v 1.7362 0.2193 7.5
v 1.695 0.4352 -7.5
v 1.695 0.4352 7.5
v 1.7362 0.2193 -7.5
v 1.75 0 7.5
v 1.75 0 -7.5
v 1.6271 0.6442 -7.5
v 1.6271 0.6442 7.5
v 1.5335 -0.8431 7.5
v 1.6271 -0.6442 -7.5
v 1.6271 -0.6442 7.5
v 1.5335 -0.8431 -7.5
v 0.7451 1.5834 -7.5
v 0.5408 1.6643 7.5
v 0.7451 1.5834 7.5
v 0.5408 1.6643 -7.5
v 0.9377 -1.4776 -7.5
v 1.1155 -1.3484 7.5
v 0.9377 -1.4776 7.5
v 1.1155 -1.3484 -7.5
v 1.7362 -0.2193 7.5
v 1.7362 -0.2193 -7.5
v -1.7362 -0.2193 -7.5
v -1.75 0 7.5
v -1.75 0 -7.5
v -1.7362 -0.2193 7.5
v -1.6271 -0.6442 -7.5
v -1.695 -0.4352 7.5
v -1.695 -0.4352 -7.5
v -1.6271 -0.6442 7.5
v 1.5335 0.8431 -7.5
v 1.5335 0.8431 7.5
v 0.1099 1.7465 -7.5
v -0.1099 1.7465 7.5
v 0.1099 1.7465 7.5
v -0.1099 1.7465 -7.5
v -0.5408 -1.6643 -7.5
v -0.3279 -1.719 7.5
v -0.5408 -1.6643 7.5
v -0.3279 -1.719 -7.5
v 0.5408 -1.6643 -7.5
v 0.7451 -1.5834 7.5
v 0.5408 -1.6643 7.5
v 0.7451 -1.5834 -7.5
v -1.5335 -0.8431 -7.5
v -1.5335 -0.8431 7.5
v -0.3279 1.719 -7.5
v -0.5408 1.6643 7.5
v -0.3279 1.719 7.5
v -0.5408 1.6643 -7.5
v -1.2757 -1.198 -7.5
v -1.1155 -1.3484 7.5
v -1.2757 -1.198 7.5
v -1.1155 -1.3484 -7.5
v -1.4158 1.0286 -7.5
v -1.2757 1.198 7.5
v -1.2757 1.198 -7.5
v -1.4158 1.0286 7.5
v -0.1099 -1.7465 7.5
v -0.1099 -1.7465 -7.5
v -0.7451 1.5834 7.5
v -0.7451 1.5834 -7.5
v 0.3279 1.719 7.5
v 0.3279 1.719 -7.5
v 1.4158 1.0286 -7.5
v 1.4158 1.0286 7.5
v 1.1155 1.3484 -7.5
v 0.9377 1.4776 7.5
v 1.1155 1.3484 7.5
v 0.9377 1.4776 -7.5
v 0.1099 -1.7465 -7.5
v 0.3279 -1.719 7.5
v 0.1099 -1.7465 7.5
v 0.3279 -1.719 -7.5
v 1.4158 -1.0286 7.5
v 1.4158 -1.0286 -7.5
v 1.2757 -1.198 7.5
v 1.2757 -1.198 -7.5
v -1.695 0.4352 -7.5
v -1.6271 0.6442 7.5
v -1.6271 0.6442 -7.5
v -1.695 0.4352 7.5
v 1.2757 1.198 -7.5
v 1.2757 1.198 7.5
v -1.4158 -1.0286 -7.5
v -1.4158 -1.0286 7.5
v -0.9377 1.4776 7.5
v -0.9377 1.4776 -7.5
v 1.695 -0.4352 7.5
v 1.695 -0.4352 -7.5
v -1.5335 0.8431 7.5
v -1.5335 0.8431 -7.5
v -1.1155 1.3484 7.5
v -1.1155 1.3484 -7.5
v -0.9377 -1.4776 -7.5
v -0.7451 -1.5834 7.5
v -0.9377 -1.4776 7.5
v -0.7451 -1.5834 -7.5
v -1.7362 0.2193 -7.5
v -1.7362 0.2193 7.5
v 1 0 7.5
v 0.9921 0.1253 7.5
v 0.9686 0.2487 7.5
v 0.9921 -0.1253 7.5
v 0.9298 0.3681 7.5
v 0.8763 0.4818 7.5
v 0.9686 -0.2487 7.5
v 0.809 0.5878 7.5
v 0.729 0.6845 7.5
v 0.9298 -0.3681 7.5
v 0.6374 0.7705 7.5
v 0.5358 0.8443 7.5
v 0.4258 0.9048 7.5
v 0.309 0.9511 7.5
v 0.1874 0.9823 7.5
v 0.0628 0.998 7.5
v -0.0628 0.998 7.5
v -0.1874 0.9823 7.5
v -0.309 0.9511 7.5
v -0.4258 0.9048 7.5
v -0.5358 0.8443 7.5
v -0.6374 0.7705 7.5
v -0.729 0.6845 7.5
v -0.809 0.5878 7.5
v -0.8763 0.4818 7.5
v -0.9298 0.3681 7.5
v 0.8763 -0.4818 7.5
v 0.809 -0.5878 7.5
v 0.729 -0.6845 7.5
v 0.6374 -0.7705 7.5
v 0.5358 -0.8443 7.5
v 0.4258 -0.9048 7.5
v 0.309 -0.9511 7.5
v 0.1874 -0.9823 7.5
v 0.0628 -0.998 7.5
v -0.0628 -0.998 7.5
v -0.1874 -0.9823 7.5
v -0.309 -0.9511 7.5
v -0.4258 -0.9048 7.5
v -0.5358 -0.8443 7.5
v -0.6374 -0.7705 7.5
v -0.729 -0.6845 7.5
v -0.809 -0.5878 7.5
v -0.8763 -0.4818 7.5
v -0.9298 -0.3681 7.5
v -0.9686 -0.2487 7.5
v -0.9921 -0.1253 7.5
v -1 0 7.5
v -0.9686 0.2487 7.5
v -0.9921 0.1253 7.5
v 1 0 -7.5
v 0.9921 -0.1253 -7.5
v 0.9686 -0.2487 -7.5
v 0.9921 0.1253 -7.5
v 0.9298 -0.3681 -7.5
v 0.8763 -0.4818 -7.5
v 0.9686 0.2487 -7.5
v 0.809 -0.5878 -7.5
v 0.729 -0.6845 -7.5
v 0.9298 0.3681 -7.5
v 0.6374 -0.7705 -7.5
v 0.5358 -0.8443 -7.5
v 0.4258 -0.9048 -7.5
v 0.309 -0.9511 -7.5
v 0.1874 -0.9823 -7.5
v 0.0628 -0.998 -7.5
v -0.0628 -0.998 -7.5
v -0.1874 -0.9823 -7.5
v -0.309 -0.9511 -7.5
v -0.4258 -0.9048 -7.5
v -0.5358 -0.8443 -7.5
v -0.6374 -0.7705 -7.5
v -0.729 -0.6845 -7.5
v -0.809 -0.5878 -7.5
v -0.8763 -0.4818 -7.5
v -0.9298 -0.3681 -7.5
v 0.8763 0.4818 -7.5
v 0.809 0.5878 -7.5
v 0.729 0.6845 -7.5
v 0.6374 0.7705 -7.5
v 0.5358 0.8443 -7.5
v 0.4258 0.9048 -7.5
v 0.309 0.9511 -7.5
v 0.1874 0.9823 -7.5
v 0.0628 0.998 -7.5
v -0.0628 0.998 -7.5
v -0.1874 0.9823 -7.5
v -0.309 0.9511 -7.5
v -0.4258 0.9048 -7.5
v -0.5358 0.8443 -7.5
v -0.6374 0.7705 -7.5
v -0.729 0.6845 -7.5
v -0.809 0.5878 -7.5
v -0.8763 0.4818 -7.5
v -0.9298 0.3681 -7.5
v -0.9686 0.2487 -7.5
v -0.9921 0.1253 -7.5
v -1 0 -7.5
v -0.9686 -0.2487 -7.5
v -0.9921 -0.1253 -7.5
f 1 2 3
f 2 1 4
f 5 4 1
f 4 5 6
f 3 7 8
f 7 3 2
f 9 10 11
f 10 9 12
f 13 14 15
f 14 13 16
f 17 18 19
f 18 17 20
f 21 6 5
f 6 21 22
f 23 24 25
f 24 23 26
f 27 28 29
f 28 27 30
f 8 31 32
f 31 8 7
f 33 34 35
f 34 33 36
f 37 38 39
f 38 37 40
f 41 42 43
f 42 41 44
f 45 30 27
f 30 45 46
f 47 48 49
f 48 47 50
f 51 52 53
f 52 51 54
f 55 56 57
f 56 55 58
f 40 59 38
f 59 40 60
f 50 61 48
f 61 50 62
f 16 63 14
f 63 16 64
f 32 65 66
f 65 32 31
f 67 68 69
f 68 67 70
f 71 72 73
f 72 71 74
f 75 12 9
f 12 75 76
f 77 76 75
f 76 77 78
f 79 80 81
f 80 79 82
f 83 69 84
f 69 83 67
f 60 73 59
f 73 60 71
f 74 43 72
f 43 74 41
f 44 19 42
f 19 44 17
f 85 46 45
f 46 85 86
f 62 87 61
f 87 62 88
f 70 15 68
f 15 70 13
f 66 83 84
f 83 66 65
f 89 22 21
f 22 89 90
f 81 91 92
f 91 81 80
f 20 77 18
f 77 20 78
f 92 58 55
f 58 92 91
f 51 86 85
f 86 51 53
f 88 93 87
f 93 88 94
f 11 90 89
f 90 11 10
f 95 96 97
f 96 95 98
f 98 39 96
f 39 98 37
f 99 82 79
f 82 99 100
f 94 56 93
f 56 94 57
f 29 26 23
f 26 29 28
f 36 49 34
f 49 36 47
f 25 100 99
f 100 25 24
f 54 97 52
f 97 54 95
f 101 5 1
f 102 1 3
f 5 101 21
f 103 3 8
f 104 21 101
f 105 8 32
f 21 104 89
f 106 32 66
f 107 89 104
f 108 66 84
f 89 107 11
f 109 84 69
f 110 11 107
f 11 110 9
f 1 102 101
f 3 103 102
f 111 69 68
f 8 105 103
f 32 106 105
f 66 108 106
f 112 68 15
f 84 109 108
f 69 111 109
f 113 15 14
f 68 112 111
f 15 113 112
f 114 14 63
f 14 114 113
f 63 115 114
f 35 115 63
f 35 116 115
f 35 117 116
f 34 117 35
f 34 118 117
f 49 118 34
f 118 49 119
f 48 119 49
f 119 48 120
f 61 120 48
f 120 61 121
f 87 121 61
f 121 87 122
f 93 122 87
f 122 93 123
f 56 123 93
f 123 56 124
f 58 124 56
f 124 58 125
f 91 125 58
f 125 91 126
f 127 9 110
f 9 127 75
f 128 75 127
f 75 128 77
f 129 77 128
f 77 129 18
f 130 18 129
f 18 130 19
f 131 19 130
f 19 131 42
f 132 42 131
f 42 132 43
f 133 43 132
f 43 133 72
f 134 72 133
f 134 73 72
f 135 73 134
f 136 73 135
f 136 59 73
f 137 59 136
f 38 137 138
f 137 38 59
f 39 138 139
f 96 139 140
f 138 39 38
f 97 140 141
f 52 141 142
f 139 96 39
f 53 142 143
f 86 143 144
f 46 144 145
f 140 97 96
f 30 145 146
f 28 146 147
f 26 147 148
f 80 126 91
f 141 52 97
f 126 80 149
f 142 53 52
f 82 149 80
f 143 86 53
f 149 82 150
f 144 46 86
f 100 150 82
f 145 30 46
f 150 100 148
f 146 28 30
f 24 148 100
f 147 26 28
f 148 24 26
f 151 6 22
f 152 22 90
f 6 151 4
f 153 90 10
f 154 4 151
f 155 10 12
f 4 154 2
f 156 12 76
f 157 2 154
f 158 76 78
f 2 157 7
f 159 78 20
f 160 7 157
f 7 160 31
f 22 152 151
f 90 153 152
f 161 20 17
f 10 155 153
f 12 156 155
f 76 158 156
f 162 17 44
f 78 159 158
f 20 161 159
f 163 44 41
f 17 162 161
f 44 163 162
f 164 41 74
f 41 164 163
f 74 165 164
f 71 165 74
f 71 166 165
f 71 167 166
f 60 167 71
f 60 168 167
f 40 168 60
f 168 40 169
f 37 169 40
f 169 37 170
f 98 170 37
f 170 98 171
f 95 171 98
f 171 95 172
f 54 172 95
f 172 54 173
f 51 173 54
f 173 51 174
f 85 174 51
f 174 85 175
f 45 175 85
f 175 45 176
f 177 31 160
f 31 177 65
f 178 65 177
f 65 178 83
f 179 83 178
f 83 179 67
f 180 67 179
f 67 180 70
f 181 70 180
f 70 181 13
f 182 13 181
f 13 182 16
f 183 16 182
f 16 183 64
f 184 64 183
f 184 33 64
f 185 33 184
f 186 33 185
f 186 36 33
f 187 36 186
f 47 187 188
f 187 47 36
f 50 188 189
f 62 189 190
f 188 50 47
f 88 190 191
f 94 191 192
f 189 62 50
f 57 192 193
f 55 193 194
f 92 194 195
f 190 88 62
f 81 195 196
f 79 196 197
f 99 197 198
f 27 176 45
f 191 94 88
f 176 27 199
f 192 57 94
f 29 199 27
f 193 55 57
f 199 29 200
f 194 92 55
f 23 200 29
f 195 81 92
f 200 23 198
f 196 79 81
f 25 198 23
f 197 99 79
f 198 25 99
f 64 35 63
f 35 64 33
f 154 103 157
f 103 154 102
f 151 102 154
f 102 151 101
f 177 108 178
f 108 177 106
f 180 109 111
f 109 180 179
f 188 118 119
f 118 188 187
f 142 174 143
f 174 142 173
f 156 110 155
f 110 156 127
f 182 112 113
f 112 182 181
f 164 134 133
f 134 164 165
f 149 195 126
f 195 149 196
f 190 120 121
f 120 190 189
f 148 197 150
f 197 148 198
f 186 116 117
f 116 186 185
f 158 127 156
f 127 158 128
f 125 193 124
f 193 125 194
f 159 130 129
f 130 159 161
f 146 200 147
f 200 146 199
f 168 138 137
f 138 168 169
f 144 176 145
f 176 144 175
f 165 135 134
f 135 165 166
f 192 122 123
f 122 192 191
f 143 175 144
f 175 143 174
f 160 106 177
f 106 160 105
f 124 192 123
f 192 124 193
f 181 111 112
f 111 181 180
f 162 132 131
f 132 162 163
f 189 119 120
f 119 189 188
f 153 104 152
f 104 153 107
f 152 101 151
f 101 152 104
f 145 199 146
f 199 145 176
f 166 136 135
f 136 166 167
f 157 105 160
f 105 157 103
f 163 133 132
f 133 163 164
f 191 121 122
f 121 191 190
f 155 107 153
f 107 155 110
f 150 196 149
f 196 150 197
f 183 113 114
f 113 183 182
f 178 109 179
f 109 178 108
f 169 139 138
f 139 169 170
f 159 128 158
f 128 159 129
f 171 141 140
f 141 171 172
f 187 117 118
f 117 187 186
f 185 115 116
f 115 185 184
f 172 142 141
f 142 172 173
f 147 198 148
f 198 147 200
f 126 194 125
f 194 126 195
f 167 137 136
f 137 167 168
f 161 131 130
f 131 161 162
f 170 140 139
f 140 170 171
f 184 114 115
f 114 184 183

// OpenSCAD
$fn = 50;


difference() {
	union() {
		translate(v = [0, 0, -7.5000000000]) {
			cylinder(h = 15, r = 1.7500000000);
		}
	}
	union() {
		translate(v = [0, 0, -100.0000000000]) {
			cylinder(h = 200, r = 1.0000000000);
		}
	}
}
